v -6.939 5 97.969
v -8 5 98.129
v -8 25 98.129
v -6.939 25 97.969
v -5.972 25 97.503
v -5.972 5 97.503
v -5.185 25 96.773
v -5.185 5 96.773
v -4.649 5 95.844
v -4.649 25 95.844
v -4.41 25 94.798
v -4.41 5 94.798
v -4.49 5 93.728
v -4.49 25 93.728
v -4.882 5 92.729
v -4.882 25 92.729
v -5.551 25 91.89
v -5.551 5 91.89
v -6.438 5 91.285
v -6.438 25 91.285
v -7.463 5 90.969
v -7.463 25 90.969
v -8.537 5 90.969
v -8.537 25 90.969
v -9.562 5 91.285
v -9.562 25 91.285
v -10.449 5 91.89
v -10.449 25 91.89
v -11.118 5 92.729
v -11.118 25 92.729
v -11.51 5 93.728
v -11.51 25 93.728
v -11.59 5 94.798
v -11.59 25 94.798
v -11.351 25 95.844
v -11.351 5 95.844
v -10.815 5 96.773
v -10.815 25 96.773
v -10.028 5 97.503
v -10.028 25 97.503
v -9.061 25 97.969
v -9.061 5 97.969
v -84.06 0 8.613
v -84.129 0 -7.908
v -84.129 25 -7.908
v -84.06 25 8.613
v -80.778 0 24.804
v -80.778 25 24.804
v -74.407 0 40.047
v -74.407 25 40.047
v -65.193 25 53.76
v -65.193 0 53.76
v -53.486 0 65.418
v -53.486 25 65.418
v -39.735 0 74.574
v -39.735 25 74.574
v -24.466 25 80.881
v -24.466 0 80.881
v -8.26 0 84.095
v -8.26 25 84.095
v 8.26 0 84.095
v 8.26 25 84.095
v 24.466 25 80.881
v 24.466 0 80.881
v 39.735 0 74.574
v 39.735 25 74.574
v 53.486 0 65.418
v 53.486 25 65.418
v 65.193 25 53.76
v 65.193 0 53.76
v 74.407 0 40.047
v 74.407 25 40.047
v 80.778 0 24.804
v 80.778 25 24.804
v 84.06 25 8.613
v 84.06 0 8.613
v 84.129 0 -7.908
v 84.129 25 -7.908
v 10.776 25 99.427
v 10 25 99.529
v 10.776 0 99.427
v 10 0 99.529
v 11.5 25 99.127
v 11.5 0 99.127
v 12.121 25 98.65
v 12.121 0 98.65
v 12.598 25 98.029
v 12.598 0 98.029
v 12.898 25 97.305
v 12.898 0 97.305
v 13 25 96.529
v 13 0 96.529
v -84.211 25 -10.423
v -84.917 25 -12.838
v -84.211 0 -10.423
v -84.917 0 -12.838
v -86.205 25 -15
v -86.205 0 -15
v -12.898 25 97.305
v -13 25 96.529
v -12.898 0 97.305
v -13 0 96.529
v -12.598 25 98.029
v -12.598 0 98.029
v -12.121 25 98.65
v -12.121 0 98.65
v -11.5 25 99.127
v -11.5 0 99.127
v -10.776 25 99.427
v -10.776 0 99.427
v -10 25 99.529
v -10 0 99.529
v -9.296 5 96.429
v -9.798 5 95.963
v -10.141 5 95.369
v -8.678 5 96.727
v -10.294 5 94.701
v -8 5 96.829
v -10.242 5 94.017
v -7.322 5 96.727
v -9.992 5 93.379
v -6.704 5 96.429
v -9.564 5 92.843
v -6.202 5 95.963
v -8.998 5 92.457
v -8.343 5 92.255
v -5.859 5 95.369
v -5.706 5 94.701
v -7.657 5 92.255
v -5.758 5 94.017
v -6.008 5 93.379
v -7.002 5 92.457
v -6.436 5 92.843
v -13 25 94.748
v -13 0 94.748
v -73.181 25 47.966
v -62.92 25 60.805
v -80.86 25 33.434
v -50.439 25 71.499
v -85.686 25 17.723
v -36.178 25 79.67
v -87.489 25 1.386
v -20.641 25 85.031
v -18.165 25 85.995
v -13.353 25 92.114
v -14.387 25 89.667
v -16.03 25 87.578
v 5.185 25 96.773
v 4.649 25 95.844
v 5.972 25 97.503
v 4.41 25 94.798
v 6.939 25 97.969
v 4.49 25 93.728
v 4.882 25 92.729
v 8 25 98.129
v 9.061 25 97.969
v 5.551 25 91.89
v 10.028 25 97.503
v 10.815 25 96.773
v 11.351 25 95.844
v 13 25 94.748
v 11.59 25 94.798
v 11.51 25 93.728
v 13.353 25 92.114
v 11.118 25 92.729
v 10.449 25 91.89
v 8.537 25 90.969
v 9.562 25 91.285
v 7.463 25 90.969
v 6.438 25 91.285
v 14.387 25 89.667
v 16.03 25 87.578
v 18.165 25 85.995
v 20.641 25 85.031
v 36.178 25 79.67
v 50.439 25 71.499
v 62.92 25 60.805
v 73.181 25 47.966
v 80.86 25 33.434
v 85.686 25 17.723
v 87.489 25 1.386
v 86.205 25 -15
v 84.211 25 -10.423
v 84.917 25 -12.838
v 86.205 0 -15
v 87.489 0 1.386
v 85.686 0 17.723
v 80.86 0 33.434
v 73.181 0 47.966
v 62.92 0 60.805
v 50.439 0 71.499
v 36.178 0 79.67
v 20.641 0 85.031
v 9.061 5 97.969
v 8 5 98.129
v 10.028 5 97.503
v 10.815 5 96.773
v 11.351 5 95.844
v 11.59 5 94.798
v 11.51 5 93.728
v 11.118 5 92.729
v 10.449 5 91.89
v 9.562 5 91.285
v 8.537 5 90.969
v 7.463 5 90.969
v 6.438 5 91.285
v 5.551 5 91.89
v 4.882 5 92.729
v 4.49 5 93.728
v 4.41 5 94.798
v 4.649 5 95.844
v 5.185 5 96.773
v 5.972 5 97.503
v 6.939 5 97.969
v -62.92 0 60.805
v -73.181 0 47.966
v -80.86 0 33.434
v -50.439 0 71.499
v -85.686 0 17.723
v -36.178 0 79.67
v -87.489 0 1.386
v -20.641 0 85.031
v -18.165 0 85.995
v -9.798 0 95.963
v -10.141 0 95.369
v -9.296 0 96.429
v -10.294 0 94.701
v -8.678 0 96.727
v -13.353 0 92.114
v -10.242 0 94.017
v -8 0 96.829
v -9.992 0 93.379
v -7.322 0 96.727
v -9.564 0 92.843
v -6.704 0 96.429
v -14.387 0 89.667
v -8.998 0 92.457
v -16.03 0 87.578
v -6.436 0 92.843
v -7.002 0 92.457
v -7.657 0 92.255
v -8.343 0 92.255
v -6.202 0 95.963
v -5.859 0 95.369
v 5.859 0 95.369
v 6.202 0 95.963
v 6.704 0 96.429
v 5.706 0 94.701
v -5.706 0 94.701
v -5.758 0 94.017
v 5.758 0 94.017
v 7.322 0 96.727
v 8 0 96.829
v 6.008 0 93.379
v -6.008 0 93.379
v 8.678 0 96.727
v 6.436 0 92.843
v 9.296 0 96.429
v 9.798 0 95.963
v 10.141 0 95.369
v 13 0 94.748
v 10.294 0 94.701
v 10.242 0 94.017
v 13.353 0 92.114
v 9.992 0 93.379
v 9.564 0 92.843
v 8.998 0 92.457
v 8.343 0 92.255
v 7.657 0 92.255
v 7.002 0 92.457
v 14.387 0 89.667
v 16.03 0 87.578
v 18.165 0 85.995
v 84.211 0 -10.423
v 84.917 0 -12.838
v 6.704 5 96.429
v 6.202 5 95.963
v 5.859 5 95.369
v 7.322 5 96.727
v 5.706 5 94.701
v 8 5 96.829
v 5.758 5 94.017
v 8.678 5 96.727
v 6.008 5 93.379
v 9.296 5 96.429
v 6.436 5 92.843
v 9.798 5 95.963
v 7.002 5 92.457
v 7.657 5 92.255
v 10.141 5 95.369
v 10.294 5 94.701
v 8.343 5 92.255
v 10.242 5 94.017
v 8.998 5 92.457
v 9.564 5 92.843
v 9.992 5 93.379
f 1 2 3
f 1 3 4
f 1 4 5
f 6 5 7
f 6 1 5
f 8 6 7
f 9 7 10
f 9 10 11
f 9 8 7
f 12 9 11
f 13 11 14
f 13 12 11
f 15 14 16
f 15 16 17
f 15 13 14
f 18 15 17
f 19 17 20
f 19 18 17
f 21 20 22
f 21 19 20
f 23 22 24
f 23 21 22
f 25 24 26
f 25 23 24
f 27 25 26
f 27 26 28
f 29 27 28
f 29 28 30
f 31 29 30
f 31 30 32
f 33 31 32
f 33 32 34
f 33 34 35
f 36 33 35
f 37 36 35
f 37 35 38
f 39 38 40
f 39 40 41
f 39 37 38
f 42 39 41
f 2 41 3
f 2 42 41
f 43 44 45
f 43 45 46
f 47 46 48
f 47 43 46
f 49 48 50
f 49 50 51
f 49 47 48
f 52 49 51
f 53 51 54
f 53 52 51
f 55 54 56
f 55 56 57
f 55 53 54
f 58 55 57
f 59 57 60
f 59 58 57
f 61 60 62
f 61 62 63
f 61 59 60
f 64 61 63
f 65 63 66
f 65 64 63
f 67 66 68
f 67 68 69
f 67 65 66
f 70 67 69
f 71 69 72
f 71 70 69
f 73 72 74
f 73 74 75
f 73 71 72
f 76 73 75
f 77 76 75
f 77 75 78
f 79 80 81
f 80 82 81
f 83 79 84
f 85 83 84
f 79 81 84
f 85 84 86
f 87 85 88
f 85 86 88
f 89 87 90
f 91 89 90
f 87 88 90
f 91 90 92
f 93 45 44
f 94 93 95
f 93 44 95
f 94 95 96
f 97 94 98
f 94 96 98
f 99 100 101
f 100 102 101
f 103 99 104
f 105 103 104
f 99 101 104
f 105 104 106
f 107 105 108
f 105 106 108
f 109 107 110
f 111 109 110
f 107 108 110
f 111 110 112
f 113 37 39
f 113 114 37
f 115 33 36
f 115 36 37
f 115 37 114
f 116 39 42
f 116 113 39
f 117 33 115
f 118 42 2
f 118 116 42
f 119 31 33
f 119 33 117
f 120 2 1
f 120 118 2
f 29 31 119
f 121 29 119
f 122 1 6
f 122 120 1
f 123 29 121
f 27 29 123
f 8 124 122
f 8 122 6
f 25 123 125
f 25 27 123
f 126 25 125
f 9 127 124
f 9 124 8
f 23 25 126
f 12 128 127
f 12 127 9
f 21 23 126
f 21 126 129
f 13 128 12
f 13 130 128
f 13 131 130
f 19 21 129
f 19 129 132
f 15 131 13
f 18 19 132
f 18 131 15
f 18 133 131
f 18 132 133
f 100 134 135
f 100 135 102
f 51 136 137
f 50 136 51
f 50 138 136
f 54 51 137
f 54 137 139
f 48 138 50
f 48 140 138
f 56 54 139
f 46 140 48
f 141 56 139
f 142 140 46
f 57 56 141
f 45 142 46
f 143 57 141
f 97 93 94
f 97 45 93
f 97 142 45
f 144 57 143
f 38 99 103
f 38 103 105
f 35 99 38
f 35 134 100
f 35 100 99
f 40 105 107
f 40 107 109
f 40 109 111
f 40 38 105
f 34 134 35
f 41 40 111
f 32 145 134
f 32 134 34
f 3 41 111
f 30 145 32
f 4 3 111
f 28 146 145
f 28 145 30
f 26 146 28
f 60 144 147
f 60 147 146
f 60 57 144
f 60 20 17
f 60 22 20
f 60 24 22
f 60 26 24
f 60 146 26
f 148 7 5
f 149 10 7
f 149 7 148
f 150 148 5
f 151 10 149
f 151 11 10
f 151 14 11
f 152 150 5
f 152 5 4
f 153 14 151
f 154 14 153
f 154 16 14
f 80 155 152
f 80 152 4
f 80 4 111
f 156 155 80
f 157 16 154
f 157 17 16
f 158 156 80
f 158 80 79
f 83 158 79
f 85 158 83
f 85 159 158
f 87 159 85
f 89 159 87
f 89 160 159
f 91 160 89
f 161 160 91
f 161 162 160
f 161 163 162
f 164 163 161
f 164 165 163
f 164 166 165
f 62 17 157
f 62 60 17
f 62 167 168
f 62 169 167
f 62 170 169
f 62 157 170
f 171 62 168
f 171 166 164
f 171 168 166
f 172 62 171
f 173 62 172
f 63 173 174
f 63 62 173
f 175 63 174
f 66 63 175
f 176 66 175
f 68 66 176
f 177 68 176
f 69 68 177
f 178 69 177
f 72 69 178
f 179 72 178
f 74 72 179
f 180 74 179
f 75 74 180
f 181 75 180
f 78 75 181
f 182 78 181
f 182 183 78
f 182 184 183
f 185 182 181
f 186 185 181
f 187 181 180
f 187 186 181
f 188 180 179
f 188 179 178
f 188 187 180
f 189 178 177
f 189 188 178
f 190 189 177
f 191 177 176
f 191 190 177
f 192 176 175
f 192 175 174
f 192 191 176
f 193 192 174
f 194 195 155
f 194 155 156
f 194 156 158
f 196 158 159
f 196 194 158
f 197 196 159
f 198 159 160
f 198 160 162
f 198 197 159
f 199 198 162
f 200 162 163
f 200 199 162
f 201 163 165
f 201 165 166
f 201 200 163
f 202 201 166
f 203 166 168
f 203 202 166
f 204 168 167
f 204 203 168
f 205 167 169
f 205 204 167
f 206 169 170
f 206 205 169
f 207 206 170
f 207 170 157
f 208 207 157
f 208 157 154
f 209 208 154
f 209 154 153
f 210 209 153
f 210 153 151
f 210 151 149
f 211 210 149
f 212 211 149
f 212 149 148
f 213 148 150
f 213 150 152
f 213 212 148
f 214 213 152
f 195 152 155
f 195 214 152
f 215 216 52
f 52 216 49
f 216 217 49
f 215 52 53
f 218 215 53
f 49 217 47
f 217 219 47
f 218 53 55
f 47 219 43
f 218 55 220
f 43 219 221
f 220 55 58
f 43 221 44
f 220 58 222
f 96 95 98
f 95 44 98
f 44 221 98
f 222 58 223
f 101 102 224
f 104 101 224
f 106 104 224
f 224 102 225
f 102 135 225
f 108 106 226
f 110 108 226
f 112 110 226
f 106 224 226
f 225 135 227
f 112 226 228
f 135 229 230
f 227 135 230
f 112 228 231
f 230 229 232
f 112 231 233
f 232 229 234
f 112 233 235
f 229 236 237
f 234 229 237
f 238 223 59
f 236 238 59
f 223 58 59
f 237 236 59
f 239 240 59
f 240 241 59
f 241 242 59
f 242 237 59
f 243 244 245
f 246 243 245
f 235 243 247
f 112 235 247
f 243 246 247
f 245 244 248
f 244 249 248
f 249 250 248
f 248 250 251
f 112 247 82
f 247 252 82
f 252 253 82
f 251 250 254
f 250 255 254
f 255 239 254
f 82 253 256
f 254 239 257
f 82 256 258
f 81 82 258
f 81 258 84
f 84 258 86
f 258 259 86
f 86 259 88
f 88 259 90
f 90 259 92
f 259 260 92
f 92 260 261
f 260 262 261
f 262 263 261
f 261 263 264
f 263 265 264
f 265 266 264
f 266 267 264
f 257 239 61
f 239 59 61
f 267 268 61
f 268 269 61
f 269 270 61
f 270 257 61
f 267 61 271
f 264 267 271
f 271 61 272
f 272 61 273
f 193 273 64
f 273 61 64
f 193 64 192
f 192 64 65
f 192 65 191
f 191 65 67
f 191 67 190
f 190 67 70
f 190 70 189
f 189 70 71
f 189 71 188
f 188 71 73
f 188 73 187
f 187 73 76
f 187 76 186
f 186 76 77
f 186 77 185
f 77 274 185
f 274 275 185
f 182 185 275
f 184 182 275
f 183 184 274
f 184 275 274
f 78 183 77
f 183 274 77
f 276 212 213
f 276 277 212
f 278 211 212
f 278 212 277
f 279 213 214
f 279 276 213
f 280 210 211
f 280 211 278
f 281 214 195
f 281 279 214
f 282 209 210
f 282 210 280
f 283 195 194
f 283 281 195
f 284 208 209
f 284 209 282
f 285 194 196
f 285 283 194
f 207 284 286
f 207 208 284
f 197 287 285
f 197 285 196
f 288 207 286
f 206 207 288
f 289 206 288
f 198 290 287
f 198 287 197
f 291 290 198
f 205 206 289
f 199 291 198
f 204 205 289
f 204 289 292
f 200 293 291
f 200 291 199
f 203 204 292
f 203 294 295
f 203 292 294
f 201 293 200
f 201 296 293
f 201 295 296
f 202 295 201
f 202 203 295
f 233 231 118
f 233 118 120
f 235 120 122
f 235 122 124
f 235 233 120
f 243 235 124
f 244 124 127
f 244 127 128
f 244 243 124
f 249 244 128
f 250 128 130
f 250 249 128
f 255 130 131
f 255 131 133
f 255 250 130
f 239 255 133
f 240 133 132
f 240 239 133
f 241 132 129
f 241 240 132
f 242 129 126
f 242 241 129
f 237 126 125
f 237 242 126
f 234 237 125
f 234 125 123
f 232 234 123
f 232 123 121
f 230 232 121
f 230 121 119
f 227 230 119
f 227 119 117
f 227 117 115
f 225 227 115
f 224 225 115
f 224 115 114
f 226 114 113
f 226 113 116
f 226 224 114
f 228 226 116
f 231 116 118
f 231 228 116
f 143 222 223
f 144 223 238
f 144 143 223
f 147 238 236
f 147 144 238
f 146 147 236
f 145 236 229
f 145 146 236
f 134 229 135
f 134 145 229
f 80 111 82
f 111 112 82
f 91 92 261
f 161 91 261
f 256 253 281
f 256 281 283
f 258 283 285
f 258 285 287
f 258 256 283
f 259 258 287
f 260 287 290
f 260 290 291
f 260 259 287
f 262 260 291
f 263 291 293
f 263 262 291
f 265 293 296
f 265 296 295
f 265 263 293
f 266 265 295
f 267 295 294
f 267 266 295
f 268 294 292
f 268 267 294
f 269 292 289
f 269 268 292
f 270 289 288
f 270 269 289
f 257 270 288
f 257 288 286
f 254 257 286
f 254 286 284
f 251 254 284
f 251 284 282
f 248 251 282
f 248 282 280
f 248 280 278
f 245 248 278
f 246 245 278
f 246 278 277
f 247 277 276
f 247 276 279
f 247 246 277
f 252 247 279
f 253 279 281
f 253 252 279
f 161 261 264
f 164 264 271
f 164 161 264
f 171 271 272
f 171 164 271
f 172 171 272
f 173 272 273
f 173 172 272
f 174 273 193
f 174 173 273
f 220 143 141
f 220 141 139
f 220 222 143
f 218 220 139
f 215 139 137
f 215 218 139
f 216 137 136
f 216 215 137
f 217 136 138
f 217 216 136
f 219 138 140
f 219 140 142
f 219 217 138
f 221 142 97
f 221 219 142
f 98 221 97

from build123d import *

# Parameters (mm, degrees)
SKETCH_1_R      = 3.6
SKETCH_1_R_2    = 2.3
EXTRUDE_1_DEPTH = 5
EXTRUDE_START   = 5
SKETCH_1_8_R    = 3.6
EXTRUDE_2_DEPTH = 20
FILLET_2_R      = 10
FILLET_3_R      = 3


with BuildPart() as part:
    # 草图1 → 凸台-拉伸1 (new body)
    # profile 1 of 5: a face of its own
    with BuildSketch(Plane(origin=(0, 0, 5), x_dir=(1, 0, 0), z_dir=(0, 1, 0))):
        with BuildLine():
            ThreePointArc((13, -81.528896907), (0, -82.5), (-13, -81.528896907))
            Line((-13, -81.528896907), (-13, -94.528896907))
            Line((-13, -94.528896907), (13, -94.528896907))
            Line((13, -94.528896907), (13, -81.528896907))
        make_face()
        with Locations((-8, -89.528896907)):
            Circle(SKETCH_1_R, mode=Mode.SUBTRACT)
        with Locations((8, -89.528896907)):
            Circle(SKETCH_1_R, mode=Mode.SUBTRACT)
    # profile 2 of 5: a face of its own
    with BuildSketch(Plane(origin=(0, 0, 5), x_dir=(1, 0, 0), z_dir=(0, 1, 0))):
        with BuildLine():
            ThreePointArc((-83.157982179, 20), (0, -79.5), (83.157982179, 20))
            Line((83.157982179, 20), (86.204698248, 20))
            ThreePointArc((86.204698248, 20), (0, -82.5), (-86.204698248, 20))
            Line((-86.204698248, 20), (-83.157982179, 20))
        make_face()
    # profile 3 of 5: a face of its own
    with BuildSketch(Plane(origin=(0, 0, 5), x_dir=(1, 0, 0), z_dir=(0, 1, 0))):
        with BuildLine():
            ThreePointArc((13, -81.528896907), (0, -82.5), (-13, -81.528896907))
            Line((-13, -81.528896907), (-13, -94.528896907))
            Line((-13, -94.528896907), (13, -94.528896907))
            Line((13, -94.528896907), (13, -81.528896907))
        make_face()
        with Locations((-8, -89.528896907)):
            Circle(SKETCH_1_R, mode=Mode.SUBTRACT)
        with Locations((8, -89.528896907)):
            Circle(SKETCH_1_R, mode=Mode.SUBTRACT)
    # profile 4 of 5: a face of its own
    with BuildSketch(Plane(origin=(0, 0, 5), x_dir=(1, 0, 0), z_dir=(0, 1, 0))):
        with Locations((-8, -89.528896907)):
            Circle(SKETCH_1_R)
        with Locations(Location((-8, -89.528896907, 0), (0, 0, 270))):
            Circle(SKETCH_1_R_2, mode=Mode.SUBTRACT)
    # profile 5 of 5: a face of its own
    with BuildSketch(Plane(origin=(0, 0, 5), x_dir=(1, 0, 0), z_dir=(0, 1, 0))):
        with Locations((8, -89.528896907)):
            Circle(SKETCH_1_R)
        with Locations(Location((8, -89.528896907, 0), (0, 0, 270))):
            Circle(SKETCH_1_R_2, mode=Mode.SUBTRACT)
    extrude(amount=EXTRUDE_1_DEPTH)

    # 草图1<8> → 凸台-拉伸2 (add)
    # profile 1 of 3: a face of its own
    with BuildSketch(Plane(origin=(0, 0, 5), x_dir=(1, 0, 0), z_dir=(0, 1, 0)).offset(EXTRUDE_START)):
        with BuildLine():
            ThreePointArc((13, -81.528896907), (0, -82.5), (-13, -81.528896907))
            Line((-13, -81.528896907), (-13, -94.528896907))
            Line((-13, -94.528896907), (13, -94.528896907))
            Line((13, -94.528896907), (13, -81.528896907))
        make_face()
        with Locations(Location((-8, -89.528896907, 0), (0, 0, 270))):
            Circle(SKETCH_1_8_R, mode=Mode.SUBTRACT)
        with Locations(Location((8, -89.528896907, 0), (0, 0, 270))):
            Circle(SKETCH_1_8_R, mode=Mode.SUBTRACT)
    # profile 2 of 3: a face of its own
    with BuildSketch(Plane(origin=(0, 0, 5), x_dir=(1, 0, 0), z_dir=(0, 1, 0)).offset(EXTRUDE_START)):
        with BuildLine():
            ThreePointArc((-83.157982179, 20), (0, -79.5), (83.157982179, 20))
            Line((83.157982179, 20), (86.204698248, 20))
            ThreePointArc((86.204698248, 20), (0, -82.5), (-86.204698248, 20))
            Line((-86.204698248, 20), (-83.157982179, 20))
        make_face()
    # profile 3 of 3: a face of its own
    with BuildSketch(Plane(origin=(0, 0, 5), x_dir=(1, 0, 0), z_dir=(0, 1, 0)).offset(EXTRUDE_START)):
        with BuildLine():
            ThreePointArc((13, -81.528896907), (0, -82.5), (-13, -81.528896907))
            Line((-13, -81.528896907), (-13, -94.528896907))
            Line((-13, -94.528896907), (13, -94.528896907))
            Line((13, -94.528896907), (13, -81.528896907))
        make_face()
        with Locations(Location((-8, -89.528896907, 0), (0, 0, 270))):
            Circle(SKETCH_1_8_R, mode=Mode.SUBTRACT)
        with Locations(Location((8, -89.528896907, 0), (0, 0, 270))):
            Circle(SKETCH_1_8_R, mode=Mode.SUBTRACT)
    extrude(amount=EXTRUDE_2_DEPTH)

    # 圆角2
    # the kernel refuses this fillet: 10 mm, written as the material it adds along each edge
    with BuildSketch(Plane(origin=(13, 25, 86.528896907), x_dir=(0, 0, 1), z_dir=(0, -1, 0))) as fillet_2_piece_1:
        with BuildLine():
            CenterArc((8.219454002, -10), FILLET_2_R, 90, 76.355470557)
            ThreePointArc((-1.498325579, -7.641025641), (-0.664124715, -3.837187901), (0, 0))
            Line((0, 0), (8.219454002, 0))
        make_face()
    extrude(amount=25)
    with BuildSketch(Plane(origin=(-13, 25, 86.528896907), x_dir=(-0.9813116821933555, 0, -0.1924250045884026), z_dir=(0, -1, 0))) as fillet_2_piece_2:
        with BuildLine():
            CenterArc((8.231488348, -9.990096279), FILLET_2_R, 92.550190808, 76.355470557)
            Line((-1.581628474, -8.065846233), (0, 0))
            ThreePointArc((0, 0), (3.893271516, -0.086657558), (7.786543032, 0))
        make_face()
    extrude(amount=25)
    # the kernel refuses this fillet: 10 mm, written as the material it takes off along each edge
    with BuildSketch(Plane(origin=(-83.157982179, -17.895247065, -15), x_dir=(-0.13567256273252146, 0, 0.9907537311166635), z_dir=(0, 1, 0))) as fillet_2_2_piece_1:
        with BuildLine():
            CenterArc((7.581654969, -9.991025983), FILLET_2_R, 92.427524139, 43.365844963)
            Line((0.413355777, -3.018545313), (0, 0))
            ThreePointArc((0, 0), (3.579049413, -0.075830444), (7.158098826, 0))
        make_face()
    extrude(amount=60.790494129, mode=Mode.SUBTRACT)
    with BuildSketch(Plane(origin=(83.157982179, -17.895247065, -15), x_dir=(1, 0, 0), z_dir=(0, 1, 0))) as fillet_2_2_piece_2:
        with BuildLine():
            CenterArc((10.92726883, -6.15604485), FILLET_2_R, 142.004143618, 43.365844963)
            ThreePointArc((0.971157612, -7.091913119), (0.560708101, -3.535668449), (0, 0))
            Line((0, 0), (3.046716069, 0))
        make_face()
    extrude(amount=60.790494129, mode=Mode.SUBTRACT)

    # 圆角3
    fillet_3_edges = [part.edges().sort_by_distance(p)[0] for p in [
        (13, 12.5, 99.528896907),
        (-13, 12.5, 99.528896907),
    ]]
    fillet(fillet_3_edges, radius=FILLET_3_R)


solid = part.part
